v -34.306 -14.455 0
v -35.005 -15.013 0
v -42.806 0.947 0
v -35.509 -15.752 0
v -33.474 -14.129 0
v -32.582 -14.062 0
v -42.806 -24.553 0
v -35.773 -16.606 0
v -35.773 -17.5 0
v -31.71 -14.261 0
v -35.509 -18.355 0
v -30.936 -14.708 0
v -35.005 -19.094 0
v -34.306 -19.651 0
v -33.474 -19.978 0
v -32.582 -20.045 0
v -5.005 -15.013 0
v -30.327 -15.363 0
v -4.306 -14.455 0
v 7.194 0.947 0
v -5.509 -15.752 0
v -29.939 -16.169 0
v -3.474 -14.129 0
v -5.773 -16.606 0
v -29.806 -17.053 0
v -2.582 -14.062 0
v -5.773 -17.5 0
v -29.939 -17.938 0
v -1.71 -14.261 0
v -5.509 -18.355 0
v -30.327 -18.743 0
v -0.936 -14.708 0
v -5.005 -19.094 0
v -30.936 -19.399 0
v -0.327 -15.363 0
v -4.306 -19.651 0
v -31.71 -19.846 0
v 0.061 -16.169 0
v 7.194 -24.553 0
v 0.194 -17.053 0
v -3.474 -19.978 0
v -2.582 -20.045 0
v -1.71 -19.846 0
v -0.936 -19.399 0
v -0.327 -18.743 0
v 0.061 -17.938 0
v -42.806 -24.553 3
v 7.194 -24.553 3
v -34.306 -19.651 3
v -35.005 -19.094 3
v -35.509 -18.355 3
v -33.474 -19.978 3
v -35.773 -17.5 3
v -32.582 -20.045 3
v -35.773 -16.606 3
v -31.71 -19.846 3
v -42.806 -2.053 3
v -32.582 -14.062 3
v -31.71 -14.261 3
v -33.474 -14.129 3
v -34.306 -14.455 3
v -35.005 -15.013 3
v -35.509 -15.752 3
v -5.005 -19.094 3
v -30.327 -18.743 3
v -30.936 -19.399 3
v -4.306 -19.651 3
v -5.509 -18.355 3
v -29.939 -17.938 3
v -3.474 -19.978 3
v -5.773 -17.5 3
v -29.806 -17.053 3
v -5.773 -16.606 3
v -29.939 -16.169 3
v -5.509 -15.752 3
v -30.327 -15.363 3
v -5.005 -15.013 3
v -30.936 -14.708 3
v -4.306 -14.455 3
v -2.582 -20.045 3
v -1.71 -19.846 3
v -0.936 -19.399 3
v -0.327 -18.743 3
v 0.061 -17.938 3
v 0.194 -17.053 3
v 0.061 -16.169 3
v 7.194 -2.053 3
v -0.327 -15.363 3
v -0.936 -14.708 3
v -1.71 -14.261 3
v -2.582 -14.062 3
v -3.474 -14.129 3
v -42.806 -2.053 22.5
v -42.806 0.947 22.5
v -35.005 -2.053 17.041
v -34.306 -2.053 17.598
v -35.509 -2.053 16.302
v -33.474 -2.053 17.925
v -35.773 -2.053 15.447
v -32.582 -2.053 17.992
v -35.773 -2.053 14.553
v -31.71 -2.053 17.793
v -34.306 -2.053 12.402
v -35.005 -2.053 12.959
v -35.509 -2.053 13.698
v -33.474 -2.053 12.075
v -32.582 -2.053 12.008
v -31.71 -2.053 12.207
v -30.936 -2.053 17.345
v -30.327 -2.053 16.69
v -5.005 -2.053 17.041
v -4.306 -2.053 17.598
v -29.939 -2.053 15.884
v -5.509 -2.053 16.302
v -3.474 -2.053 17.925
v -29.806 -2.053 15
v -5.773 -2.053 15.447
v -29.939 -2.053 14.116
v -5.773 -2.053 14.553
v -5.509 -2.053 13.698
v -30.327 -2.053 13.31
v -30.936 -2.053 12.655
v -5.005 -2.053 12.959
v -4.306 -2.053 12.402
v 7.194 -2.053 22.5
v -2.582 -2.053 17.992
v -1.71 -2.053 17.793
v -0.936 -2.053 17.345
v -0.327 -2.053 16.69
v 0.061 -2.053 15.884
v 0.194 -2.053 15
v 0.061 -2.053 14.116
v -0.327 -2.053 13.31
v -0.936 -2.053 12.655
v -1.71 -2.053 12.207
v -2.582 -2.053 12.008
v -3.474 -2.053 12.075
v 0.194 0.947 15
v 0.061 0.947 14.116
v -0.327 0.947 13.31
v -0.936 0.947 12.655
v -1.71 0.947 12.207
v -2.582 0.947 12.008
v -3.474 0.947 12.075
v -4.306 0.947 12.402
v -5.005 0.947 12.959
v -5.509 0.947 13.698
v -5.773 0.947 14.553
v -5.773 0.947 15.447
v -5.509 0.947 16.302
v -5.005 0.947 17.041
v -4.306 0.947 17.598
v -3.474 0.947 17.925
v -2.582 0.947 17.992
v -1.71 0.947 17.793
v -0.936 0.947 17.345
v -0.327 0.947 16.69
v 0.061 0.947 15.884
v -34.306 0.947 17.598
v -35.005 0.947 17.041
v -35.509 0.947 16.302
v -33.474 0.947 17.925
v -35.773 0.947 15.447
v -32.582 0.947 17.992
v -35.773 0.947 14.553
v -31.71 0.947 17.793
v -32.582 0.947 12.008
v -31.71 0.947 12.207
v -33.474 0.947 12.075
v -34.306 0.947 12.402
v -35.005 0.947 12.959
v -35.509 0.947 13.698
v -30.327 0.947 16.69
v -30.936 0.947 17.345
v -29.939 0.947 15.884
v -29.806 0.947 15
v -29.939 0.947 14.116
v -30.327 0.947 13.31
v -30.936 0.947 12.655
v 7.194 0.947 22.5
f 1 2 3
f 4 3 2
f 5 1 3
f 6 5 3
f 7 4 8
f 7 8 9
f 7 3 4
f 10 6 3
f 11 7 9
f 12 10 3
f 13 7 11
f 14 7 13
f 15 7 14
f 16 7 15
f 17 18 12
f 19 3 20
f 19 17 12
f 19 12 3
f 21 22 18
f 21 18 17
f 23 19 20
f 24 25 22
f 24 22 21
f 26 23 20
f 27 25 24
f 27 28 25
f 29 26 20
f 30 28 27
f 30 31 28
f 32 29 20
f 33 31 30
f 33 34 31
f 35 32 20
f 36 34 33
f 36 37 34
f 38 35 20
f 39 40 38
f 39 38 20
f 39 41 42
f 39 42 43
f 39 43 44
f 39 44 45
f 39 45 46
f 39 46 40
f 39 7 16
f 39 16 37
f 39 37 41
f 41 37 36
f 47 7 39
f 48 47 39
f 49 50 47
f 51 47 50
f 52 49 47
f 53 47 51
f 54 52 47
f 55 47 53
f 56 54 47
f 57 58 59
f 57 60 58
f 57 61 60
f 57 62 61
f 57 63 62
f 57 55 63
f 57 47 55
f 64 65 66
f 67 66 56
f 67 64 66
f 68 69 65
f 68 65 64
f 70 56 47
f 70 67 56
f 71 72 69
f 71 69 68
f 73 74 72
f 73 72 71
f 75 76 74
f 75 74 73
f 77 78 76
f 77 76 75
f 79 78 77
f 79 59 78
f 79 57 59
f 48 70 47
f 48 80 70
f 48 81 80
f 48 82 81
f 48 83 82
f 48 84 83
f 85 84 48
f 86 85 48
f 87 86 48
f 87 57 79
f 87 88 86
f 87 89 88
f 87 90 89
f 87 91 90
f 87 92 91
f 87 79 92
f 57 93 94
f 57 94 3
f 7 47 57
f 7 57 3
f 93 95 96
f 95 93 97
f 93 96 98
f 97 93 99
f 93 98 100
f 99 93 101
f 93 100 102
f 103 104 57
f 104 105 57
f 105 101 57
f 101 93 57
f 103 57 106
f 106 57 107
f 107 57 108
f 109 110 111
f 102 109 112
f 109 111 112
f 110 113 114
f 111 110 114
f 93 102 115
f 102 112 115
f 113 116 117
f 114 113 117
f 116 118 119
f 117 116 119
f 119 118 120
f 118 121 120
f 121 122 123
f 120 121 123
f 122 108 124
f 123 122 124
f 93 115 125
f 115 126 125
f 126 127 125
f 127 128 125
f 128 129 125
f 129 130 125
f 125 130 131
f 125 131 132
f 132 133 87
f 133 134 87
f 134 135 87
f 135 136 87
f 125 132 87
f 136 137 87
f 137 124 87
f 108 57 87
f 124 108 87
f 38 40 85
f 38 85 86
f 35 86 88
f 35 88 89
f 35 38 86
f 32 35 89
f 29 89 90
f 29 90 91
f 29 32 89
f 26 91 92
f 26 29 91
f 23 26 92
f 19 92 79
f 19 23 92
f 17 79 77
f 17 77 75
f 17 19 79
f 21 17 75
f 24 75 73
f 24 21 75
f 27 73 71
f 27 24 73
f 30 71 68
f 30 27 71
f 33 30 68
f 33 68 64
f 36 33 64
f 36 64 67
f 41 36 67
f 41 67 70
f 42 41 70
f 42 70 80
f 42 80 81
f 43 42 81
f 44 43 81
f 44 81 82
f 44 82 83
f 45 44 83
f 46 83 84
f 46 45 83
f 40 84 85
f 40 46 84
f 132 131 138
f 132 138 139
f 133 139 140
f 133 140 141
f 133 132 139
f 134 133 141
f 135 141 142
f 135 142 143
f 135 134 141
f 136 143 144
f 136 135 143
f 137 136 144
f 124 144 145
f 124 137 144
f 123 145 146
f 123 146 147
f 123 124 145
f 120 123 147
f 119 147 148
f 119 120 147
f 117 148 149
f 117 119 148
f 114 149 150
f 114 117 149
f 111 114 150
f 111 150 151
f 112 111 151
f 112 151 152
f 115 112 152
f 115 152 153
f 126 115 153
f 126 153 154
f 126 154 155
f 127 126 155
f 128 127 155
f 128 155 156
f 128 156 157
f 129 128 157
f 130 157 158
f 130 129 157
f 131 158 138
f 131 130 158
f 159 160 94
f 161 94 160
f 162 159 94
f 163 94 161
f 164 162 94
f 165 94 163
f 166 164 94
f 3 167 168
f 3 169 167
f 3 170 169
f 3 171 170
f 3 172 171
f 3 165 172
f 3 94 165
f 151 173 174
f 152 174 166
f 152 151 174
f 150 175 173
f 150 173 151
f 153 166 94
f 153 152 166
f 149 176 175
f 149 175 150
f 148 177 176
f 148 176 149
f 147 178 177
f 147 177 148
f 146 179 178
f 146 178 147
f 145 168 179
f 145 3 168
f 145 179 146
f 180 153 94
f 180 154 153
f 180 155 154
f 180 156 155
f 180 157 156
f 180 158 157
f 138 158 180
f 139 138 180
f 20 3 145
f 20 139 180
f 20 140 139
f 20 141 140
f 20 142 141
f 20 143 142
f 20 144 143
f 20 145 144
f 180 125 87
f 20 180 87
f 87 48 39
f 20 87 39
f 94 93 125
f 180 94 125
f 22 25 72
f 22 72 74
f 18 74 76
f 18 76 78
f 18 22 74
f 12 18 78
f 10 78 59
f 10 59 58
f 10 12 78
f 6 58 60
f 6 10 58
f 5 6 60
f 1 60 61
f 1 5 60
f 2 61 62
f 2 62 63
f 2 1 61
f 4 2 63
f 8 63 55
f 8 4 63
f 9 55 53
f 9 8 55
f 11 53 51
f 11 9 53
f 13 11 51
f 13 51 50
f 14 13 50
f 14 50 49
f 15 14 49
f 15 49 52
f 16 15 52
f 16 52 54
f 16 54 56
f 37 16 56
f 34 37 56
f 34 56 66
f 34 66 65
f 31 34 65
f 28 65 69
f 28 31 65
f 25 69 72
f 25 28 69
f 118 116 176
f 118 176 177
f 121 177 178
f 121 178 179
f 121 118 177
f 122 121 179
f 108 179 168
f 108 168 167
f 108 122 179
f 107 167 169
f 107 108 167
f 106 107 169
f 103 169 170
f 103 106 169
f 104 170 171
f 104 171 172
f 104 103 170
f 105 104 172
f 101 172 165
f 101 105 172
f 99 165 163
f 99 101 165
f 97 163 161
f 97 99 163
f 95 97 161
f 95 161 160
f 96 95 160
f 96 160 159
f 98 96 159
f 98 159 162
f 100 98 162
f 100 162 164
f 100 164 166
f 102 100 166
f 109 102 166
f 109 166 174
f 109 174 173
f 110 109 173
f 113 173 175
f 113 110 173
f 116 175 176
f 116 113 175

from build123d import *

# Parameters (mm, degrees)
SKETCH1_W           = 50
SKETCH1_H           = 22.5
SKETCH1_R           = 3
BOSS_EXTRUDE1_DEPTH = 3
SKETCH3_W           = 50
SKETCH3_H           = 22.5
SKETCH3_R           = 3
BOSS_EXTRUDE2_DEPTH = 3


with BuildPart() as part:
    # Sketch1 → Boss-Extrude1 (new body)
    with BuildSketch(Plane.XY):
        with Locations((-17.806163097, -13.303318659)):
            Rectangle(SKETCH1_W, SKETCH1_H)
        with Locations((-2.806163097, -17.053318659)):
            Circle(SKETCH1_R, mode=Mode.SUBTRACT)
        with Locations((-32.806163097, -17.053318659)):
            Circle(SKETCH1_R, mode=Mode.SUBTRACT)
    extrude(amount=BOSS_EXTRUDE1_DEPTH)

    # Sketch3 → Boss-Extrude2 (add)
    with BuildSketch(Plane(origin=(0, -2.053318659, 0), x_dir=(1, 0, 0), z_dir=(0, 1, 0))):
        with Locations((-17.806163097, -11.25)):
            Rectangle(SKETCH3_W, SKETCH3_H)
        with Locations((-2.806163097, -15)):
            Circle(SKETCH3_R, mode=Mode.SUBTRACT)
        with Locations((-32.806163097, -15)):
            Circle(SKETCH3_R, mode=Mode.SUBTRACT)
    extrude(amount=BOSS_EXTRUDE2_DEPTH)


solid = part.part
